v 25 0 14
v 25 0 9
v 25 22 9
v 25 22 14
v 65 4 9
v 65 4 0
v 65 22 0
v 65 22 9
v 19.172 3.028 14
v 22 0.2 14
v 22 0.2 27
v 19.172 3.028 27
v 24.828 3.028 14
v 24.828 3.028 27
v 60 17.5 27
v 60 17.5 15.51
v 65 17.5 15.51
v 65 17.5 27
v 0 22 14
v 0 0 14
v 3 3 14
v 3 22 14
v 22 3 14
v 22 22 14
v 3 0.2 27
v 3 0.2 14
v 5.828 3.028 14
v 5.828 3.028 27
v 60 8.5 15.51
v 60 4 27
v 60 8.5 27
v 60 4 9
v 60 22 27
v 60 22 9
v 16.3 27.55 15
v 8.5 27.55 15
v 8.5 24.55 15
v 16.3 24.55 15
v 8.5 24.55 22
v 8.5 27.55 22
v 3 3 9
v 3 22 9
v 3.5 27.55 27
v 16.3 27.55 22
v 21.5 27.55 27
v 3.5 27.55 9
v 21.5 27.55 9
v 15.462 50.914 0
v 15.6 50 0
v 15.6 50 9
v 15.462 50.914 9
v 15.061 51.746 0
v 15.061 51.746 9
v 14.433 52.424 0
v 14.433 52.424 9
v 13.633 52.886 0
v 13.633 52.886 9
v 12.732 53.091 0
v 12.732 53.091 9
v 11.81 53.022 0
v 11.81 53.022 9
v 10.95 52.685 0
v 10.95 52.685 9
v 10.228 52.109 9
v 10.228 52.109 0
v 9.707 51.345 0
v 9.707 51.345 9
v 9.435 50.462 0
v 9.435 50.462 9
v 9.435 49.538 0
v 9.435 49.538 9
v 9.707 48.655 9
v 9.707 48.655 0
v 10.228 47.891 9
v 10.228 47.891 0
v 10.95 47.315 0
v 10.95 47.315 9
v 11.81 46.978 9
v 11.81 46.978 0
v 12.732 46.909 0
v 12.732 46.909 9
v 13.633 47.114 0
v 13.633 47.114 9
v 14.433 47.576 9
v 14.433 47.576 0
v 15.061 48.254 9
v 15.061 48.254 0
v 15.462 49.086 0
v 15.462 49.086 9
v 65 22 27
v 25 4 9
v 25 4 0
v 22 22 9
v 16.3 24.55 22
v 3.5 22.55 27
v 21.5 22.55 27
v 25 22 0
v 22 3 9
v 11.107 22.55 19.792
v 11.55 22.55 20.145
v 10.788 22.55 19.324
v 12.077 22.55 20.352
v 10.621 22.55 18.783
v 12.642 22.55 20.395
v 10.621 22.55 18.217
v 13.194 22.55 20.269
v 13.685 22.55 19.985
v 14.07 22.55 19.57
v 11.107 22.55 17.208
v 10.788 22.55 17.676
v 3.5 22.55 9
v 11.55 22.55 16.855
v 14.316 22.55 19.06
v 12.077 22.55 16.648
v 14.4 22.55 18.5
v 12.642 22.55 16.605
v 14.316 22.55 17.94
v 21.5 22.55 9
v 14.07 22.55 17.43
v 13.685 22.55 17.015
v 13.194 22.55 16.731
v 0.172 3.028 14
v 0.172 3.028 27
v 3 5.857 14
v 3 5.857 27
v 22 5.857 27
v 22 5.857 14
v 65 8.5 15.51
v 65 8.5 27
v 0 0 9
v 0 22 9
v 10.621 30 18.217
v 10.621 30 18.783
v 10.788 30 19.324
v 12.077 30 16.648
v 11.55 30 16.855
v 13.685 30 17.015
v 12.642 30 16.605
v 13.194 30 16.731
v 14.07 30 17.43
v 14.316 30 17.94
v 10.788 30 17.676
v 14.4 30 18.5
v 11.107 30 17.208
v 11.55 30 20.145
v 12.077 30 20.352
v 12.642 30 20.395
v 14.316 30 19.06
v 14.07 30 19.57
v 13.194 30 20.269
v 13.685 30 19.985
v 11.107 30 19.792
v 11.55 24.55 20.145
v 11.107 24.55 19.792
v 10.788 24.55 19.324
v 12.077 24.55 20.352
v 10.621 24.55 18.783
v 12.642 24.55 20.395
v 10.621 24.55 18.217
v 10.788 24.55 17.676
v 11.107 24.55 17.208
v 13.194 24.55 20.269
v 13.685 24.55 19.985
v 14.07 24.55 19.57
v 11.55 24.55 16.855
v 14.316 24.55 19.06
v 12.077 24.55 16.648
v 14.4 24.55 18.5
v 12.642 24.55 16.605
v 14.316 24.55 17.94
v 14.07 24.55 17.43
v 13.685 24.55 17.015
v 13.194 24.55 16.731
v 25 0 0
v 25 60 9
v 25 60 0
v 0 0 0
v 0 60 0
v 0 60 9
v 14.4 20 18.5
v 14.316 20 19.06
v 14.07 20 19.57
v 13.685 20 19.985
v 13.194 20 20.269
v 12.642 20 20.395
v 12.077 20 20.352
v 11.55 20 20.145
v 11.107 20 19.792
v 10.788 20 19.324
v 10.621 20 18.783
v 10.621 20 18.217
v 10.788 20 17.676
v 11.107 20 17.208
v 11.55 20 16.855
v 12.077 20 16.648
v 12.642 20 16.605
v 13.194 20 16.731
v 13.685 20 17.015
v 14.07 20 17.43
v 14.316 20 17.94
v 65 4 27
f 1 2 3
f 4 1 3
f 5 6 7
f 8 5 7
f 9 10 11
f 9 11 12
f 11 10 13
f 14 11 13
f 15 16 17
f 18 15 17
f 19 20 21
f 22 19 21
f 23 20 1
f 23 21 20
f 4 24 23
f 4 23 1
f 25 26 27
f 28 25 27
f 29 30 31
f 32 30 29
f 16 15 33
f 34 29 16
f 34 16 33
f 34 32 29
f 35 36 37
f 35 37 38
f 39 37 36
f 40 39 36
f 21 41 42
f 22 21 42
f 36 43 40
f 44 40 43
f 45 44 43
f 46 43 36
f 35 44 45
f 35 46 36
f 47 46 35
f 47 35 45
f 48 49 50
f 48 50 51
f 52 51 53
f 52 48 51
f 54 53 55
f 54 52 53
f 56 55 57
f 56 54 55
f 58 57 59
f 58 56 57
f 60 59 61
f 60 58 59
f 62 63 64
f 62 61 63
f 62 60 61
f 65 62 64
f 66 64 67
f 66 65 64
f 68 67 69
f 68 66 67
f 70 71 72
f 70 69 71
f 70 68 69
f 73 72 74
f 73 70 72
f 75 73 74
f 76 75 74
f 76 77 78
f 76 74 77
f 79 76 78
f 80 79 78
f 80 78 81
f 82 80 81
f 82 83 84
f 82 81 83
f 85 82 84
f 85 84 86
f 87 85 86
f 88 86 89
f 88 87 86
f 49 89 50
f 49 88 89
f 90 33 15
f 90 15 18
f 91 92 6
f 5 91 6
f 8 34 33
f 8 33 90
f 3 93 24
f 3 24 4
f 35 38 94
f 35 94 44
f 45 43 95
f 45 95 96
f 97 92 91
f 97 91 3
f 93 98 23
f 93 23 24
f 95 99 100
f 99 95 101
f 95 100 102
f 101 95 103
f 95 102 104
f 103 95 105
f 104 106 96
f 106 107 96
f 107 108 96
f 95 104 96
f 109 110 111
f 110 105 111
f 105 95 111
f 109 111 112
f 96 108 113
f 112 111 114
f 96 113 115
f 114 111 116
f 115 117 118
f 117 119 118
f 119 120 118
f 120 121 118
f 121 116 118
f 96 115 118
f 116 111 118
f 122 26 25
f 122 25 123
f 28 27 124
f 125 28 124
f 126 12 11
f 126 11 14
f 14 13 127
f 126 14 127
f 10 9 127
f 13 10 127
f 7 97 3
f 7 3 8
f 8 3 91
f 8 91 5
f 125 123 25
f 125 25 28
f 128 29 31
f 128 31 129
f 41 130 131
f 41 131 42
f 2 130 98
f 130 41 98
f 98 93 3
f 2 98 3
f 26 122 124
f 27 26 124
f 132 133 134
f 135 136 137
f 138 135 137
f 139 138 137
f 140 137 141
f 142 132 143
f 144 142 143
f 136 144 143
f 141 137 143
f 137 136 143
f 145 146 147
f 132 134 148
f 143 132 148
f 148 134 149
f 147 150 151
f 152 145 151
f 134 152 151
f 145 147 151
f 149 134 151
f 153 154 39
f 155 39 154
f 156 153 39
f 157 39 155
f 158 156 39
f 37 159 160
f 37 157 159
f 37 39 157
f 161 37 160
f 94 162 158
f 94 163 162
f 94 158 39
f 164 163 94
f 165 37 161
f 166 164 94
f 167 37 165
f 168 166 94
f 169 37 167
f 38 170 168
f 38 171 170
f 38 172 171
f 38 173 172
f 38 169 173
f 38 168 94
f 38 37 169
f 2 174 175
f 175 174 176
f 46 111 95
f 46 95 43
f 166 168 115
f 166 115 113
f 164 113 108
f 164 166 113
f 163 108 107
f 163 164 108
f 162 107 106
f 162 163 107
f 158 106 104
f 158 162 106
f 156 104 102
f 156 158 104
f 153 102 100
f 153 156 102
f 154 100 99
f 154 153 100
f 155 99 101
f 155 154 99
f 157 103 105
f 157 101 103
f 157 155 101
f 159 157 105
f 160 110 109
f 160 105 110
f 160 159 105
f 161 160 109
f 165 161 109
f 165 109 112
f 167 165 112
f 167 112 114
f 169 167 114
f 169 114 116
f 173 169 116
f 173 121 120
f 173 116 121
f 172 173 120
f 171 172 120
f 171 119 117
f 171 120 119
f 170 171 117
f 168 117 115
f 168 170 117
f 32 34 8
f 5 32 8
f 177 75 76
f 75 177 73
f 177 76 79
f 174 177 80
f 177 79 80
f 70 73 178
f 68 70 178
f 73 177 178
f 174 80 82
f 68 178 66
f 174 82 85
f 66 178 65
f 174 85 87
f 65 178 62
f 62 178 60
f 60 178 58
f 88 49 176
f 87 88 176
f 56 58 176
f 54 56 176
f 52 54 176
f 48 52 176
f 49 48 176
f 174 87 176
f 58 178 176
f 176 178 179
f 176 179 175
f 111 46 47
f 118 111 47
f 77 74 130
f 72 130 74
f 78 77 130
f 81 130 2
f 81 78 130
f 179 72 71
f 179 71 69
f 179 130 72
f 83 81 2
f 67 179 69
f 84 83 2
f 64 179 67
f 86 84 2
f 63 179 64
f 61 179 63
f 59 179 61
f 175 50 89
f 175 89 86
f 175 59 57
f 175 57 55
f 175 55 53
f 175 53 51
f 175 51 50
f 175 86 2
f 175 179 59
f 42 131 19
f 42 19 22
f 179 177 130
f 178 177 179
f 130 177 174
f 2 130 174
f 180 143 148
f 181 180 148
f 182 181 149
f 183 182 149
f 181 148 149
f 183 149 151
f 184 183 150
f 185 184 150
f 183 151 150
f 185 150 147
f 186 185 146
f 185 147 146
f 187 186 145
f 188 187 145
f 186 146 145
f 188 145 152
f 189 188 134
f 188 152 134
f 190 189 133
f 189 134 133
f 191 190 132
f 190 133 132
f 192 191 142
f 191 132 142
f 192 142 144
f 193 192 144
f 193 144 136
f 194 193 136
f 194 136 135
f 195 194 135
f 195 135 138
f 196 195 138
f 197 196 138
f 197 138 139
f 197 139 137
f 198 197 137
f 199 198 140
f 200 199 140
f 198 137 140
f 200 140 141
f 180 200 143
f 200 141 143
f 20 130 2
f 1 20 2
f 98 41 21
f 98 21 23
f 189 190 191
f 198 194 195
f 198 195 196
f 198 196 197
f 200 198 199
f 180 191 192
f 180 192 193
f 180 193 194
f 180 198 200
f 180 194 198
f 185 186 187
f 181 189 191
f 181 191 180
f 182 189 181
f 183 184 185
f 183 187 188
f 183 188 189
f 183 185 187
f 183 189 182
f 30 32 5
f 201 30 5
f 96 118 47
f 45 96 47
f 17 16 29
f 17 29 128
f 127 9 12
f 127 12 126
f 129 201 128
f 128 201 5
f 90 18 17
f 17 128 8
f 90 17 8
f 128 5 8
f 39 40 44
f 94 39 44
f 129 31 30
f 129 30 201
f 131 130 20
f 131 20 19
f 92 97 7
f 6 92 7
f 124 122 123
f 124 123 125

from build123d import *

# Parameters (mm, degrees)
BOX002_W               = 19
BOX002_H               = 22
BOX002_DEPTH           = 10
BOX001_W               = 25
BOX001_H               = 22
BOX001_DEPTH           = 5
CYLINDER_R             = 3.1
CYLINDER_DEPTH         = 15
BOX_W                  = 25
BOX_H                  = 60
BOX_DEPTH              = 9
BOX003_W               = 4
BOX003_H               = 4
BOX003_DEPTH           = 13
BOX003_PLACEMENT_ANGLE = 45
BOX004_W               = 4
BOX004_H               = 4
BOX004_DEPTH           = 13
BOX004_PLACEMENT_ANGLE = 45
CYLINDER001_R          = 1.9
CYLINDER001_DEPTH      = 10
BOX006_W               = 7.8
BOX006_H               = 3
BOX006_DEPTH           = 7
BOX005_W               = 18
BOX005_H               = 5
BOX005_DEPTH           = 18
CYLINDER002_R          = 1.9
CYLINDER002_DEPTH      = 10
BOX007_W               = 40
BOX007_H               = 18
BOX007_DEPTH           = 9
BOX009_W               = 10
BOX009_H               = 9
BOX009_DEPTH           = 15
BOX008_W               = 5
BOX008_H               = 18
BOX008_DEPTH           = 18


with BuildPart() as cube002:
    # Box002 → Box002 (new body)
    with BuildSketch(Plane(origin=(3, 3, 8), x_dir=(1, 0, 0), z_dir=(0, 0, 1))):
        with Locations((9.5, 11)):
            Rectangle(BOX002_W, BOX002_H)
    extrude(amount=BOX002_DEPTH)


with BuildPart() as cut:
    # Box001 → Box001 (new body)
    with BuildSketch(Plane.XY.offset(9)):
        with Locations((12.5, 11)):
            Rectangle(BOX001_W, BOX001_H)
    extrude(amount=BOX001_DEPTH)

    # Cut: cut Cube002
    add(cube002.part, mode=Mode.SUBTRACT)


with BuildPart() as cylinder:
    # Cylinder → Cylinder (new body)
    with BuildSketch(Plane(origin=(12.5, 50, -3), x_dir=(1, 0, 0), z_dir=(0, 0, 1))):
        Circle(CYLINDER_R)
    extrude(amount=CYLINDER_DEPTH)


with BuildPart() as cut001:
    # Box → Box (new body)
    with BuildSketch(Plane.XY):
        with Locations((12.5, 30)):
            Rectangle(BOX_W, BOX_H)
    extrude(amount=BOX_DEPTH)

    # Cut001: cut Cylinder
    add(cylinder.part, mode=Mode.SUBTRACT)


with BuildPart() as cube003:
    # Box003 → Box003 (new body)
    with BuildSketch(Plane.XY):
        with Locations((2, 2)):
            Rectangle(BOX003_W, BOX003_H)
    extrude(amount=BOX003_DEPTH)


with BuildPart() as cube003_1:
    # Box003 placement: moved
    add(cube003.part.moved(Location((3, 0.2, 14))).rotate(Axis((3, 0.2, 14), (0, 0, 1)), BOX003_PLACEMENT_ANGLE))


with BuildPart() as cube004:
    # Box004 → Box004 (new body)
    with BuildSketch(Plane.XY):
        with Locations((2, 2)):
            Rectangle(BOX004_W, BOX004_H)
    extrude(amount=BOX004_DEPTH)


with BuildPart() as cube004_1:
    # Box004 placement: moved
    add(cube004.part.moved(Location((22, 0.2, 14))).rotate(Axis((22, 0.2, 14), (0, 0, 1)), BOX004_PLACEMENT_ANGLE))


with BuildPart() as cylinder001:
    # Cylinder001 → Cylinder001 (new body)
    with BuildSketch(Plane(origin=(12.5, 30, 18.5), x_dir=(1, 0, 0), z_dir=(0, -1, 0))):
        Circle(CYLINDER001_R)
    extrude(amount=CYLINDER001_DEPTH)


with BuildPart() as cube006:
    # Box006 → Box006 (new body)
    with BuildSketch(Plane(origin=(8.5, 24.55, 15), x_dir=(1, 0, 0), z_dir=(0, 0, 1))):
        with Locations((3.9, 1.5)):
            Rectangle(BOX006_W, BOX006_H)
    extrude(amount=BOX006_DEPTH)


with BuildPart() as cut003:
    # Box005 → Box005 (new body)
    with BuildSketch(Plane(origin=(3.5, 22.55, 9), x_dir=(1, 0, 0), z_dir=(0, 0, 1))):
        with Locations((9, 2.5)):
            Rectangle(BOX005_W, BOX005_H)
    extrude(amount=BOX005_DEPTH)

    # Cut002: cut Cube006
    add(cube006.part, mode=Mode.SUBTRACT)

    # Cut003: cut Cylinder001
    add(cylinder001.part, mode=Mode.SUBTRACT)


with BuildPart() as cylinder002:
    # Cylinder002 → Cylinder002 (new body)
    with BuildSketch(Plane(origin=(12.5, 30, 18.5), x_dir=(1, 0, 0), z_dir=(0, -1, 0))):
        Circle(CYLINDER002_R)
    extrude(amount=CYLINDER002_DEPTH)


with BuildPart() as cube007:
    # Box007 → Box007 (new body)
    with BuildSketch(Plane(origin=(25, 4, 0), x_dir=(1, 0, 0), z_dir=(0, 0, 1))):
        with Locations((20, 9)):
            Rectangle(BOX007_W, BOX007_H)
    extrude(amount=BOX007_DEPTH)


with BuildPart() as cube009:
    # Box009 → Box009 (new body)
    with BuildSketch(Plane(origin=(58, 4.5, 15.51), x_dir=(1, 0, 0), z_dir=(0, 0, 1))):
        with Locations((5, 4.5)):
            Rectangle(BOX009_W, BOX009_H)
    extrude(amount=BOX009_DEPTH)


with BuildPart() as cut004:
    # Box008 → Box008 (new body)
    with BuildSketch(Plane(origin=(60, 0, 9), x_dir=(1, 0, 0), z_dir=(0, 0, 1))):
        with Locations((2.5, 9)):
            Rectangle(BOX008_W, BOX008_H)
    extrude(amount=BOX008_DEPTH)

    # Cut004: cut Cube009
    add(cube009.part, mode=Mode.SUBTRACT)


with BuildPart() as cut004_1:
    # Cut004 placement: moved
    add(cut004.part.moved(Location((0, 4, 0))))


solid = Compound([cut.part, cut001.part, cube003_1.part, cube004_1.part, cut003.part, cylinder002.part, cube007.part, cut004_1.part])
